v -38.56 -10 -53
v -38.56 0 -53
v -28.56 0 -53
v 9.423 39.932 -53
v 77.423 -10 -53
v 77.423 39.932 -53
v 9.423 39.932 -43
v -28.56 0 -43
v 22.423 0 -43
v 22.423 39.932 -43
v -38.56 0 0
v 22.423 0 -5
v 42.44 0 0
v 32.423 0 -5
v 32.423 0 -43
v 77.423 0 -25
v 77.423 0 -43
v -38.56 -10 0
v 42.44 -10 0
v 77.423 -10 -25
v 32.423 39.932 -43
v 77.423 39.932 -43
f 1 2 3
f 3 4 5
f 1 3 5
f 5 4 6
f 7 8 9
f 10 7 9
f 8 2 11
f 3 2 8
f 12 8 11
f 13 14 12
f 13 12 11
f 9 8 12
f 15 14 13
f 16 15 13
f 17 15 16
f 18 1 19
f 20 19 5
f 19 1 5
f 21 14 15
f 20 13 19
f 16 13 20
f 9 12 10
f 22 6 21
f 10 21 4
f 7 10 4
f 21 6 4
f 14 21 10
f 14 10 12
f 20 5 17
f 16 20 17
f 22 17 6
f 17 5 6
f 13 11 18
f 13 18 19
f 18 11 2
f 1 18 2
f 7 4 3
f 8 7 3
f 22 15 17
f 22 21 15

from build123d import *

# Parameters (mm, degrees)
SKETCH2_W           = 81
SKETCH2_H           = 53
BOSS_EXTRUDE1_DEPTH = 10
BOSS_EXTRUDE2_DEPTH = 10
BOSS_EXTRUDE3_DEPTH = 10


with BuildPart() as part:
    # Sketch2 → Boss-Extrude1 (new body)
    with BuildSketch(Plane(origin=(0, 0, 0), x_dir=(1, 0, 0), z_dir=(0, 1, 0))):
        Polygon((77.422904192, 25), (77.422904192, 53), (42.44011976, 53), (42.44011976, 0), align=None)
        with Locations((1.94011976, 26.5)):
            Rectangle(SKETCH2_W, SKETCH2_H)
    extrude(amount=-BOSS_EXTRUDE1_DEPTH)

    # Sketch3 → Boss-Extrude2 (add)
    with BuildSketch(Plane(origin=(0, 0, -53), x_dir=(-1, 0, 0), z_dir=(0, 0, -1))):
        Polygon((-77.422904192, 0), (-77.422904192, 39.932268243), (-9.422904192, 39.932268243), (28.55988024, 0), align=None)
    extrude(amount=-BOSS_EXTRUDE2_DEPTH)

    # Sketch4 → Boss-Extrude3 (add)
    with BuildSketch(Plane(origin=(32.422904192, 0, 0), x_dir=(0, 0, -1), z_dir=(1, 0, 0))):
        Polygon((43, 39.932268243), (5, 0), (43, 0), align=None)
    extrude(amount=-BOSS_EXTRUDE3_DEPTH)


solid = part.part
